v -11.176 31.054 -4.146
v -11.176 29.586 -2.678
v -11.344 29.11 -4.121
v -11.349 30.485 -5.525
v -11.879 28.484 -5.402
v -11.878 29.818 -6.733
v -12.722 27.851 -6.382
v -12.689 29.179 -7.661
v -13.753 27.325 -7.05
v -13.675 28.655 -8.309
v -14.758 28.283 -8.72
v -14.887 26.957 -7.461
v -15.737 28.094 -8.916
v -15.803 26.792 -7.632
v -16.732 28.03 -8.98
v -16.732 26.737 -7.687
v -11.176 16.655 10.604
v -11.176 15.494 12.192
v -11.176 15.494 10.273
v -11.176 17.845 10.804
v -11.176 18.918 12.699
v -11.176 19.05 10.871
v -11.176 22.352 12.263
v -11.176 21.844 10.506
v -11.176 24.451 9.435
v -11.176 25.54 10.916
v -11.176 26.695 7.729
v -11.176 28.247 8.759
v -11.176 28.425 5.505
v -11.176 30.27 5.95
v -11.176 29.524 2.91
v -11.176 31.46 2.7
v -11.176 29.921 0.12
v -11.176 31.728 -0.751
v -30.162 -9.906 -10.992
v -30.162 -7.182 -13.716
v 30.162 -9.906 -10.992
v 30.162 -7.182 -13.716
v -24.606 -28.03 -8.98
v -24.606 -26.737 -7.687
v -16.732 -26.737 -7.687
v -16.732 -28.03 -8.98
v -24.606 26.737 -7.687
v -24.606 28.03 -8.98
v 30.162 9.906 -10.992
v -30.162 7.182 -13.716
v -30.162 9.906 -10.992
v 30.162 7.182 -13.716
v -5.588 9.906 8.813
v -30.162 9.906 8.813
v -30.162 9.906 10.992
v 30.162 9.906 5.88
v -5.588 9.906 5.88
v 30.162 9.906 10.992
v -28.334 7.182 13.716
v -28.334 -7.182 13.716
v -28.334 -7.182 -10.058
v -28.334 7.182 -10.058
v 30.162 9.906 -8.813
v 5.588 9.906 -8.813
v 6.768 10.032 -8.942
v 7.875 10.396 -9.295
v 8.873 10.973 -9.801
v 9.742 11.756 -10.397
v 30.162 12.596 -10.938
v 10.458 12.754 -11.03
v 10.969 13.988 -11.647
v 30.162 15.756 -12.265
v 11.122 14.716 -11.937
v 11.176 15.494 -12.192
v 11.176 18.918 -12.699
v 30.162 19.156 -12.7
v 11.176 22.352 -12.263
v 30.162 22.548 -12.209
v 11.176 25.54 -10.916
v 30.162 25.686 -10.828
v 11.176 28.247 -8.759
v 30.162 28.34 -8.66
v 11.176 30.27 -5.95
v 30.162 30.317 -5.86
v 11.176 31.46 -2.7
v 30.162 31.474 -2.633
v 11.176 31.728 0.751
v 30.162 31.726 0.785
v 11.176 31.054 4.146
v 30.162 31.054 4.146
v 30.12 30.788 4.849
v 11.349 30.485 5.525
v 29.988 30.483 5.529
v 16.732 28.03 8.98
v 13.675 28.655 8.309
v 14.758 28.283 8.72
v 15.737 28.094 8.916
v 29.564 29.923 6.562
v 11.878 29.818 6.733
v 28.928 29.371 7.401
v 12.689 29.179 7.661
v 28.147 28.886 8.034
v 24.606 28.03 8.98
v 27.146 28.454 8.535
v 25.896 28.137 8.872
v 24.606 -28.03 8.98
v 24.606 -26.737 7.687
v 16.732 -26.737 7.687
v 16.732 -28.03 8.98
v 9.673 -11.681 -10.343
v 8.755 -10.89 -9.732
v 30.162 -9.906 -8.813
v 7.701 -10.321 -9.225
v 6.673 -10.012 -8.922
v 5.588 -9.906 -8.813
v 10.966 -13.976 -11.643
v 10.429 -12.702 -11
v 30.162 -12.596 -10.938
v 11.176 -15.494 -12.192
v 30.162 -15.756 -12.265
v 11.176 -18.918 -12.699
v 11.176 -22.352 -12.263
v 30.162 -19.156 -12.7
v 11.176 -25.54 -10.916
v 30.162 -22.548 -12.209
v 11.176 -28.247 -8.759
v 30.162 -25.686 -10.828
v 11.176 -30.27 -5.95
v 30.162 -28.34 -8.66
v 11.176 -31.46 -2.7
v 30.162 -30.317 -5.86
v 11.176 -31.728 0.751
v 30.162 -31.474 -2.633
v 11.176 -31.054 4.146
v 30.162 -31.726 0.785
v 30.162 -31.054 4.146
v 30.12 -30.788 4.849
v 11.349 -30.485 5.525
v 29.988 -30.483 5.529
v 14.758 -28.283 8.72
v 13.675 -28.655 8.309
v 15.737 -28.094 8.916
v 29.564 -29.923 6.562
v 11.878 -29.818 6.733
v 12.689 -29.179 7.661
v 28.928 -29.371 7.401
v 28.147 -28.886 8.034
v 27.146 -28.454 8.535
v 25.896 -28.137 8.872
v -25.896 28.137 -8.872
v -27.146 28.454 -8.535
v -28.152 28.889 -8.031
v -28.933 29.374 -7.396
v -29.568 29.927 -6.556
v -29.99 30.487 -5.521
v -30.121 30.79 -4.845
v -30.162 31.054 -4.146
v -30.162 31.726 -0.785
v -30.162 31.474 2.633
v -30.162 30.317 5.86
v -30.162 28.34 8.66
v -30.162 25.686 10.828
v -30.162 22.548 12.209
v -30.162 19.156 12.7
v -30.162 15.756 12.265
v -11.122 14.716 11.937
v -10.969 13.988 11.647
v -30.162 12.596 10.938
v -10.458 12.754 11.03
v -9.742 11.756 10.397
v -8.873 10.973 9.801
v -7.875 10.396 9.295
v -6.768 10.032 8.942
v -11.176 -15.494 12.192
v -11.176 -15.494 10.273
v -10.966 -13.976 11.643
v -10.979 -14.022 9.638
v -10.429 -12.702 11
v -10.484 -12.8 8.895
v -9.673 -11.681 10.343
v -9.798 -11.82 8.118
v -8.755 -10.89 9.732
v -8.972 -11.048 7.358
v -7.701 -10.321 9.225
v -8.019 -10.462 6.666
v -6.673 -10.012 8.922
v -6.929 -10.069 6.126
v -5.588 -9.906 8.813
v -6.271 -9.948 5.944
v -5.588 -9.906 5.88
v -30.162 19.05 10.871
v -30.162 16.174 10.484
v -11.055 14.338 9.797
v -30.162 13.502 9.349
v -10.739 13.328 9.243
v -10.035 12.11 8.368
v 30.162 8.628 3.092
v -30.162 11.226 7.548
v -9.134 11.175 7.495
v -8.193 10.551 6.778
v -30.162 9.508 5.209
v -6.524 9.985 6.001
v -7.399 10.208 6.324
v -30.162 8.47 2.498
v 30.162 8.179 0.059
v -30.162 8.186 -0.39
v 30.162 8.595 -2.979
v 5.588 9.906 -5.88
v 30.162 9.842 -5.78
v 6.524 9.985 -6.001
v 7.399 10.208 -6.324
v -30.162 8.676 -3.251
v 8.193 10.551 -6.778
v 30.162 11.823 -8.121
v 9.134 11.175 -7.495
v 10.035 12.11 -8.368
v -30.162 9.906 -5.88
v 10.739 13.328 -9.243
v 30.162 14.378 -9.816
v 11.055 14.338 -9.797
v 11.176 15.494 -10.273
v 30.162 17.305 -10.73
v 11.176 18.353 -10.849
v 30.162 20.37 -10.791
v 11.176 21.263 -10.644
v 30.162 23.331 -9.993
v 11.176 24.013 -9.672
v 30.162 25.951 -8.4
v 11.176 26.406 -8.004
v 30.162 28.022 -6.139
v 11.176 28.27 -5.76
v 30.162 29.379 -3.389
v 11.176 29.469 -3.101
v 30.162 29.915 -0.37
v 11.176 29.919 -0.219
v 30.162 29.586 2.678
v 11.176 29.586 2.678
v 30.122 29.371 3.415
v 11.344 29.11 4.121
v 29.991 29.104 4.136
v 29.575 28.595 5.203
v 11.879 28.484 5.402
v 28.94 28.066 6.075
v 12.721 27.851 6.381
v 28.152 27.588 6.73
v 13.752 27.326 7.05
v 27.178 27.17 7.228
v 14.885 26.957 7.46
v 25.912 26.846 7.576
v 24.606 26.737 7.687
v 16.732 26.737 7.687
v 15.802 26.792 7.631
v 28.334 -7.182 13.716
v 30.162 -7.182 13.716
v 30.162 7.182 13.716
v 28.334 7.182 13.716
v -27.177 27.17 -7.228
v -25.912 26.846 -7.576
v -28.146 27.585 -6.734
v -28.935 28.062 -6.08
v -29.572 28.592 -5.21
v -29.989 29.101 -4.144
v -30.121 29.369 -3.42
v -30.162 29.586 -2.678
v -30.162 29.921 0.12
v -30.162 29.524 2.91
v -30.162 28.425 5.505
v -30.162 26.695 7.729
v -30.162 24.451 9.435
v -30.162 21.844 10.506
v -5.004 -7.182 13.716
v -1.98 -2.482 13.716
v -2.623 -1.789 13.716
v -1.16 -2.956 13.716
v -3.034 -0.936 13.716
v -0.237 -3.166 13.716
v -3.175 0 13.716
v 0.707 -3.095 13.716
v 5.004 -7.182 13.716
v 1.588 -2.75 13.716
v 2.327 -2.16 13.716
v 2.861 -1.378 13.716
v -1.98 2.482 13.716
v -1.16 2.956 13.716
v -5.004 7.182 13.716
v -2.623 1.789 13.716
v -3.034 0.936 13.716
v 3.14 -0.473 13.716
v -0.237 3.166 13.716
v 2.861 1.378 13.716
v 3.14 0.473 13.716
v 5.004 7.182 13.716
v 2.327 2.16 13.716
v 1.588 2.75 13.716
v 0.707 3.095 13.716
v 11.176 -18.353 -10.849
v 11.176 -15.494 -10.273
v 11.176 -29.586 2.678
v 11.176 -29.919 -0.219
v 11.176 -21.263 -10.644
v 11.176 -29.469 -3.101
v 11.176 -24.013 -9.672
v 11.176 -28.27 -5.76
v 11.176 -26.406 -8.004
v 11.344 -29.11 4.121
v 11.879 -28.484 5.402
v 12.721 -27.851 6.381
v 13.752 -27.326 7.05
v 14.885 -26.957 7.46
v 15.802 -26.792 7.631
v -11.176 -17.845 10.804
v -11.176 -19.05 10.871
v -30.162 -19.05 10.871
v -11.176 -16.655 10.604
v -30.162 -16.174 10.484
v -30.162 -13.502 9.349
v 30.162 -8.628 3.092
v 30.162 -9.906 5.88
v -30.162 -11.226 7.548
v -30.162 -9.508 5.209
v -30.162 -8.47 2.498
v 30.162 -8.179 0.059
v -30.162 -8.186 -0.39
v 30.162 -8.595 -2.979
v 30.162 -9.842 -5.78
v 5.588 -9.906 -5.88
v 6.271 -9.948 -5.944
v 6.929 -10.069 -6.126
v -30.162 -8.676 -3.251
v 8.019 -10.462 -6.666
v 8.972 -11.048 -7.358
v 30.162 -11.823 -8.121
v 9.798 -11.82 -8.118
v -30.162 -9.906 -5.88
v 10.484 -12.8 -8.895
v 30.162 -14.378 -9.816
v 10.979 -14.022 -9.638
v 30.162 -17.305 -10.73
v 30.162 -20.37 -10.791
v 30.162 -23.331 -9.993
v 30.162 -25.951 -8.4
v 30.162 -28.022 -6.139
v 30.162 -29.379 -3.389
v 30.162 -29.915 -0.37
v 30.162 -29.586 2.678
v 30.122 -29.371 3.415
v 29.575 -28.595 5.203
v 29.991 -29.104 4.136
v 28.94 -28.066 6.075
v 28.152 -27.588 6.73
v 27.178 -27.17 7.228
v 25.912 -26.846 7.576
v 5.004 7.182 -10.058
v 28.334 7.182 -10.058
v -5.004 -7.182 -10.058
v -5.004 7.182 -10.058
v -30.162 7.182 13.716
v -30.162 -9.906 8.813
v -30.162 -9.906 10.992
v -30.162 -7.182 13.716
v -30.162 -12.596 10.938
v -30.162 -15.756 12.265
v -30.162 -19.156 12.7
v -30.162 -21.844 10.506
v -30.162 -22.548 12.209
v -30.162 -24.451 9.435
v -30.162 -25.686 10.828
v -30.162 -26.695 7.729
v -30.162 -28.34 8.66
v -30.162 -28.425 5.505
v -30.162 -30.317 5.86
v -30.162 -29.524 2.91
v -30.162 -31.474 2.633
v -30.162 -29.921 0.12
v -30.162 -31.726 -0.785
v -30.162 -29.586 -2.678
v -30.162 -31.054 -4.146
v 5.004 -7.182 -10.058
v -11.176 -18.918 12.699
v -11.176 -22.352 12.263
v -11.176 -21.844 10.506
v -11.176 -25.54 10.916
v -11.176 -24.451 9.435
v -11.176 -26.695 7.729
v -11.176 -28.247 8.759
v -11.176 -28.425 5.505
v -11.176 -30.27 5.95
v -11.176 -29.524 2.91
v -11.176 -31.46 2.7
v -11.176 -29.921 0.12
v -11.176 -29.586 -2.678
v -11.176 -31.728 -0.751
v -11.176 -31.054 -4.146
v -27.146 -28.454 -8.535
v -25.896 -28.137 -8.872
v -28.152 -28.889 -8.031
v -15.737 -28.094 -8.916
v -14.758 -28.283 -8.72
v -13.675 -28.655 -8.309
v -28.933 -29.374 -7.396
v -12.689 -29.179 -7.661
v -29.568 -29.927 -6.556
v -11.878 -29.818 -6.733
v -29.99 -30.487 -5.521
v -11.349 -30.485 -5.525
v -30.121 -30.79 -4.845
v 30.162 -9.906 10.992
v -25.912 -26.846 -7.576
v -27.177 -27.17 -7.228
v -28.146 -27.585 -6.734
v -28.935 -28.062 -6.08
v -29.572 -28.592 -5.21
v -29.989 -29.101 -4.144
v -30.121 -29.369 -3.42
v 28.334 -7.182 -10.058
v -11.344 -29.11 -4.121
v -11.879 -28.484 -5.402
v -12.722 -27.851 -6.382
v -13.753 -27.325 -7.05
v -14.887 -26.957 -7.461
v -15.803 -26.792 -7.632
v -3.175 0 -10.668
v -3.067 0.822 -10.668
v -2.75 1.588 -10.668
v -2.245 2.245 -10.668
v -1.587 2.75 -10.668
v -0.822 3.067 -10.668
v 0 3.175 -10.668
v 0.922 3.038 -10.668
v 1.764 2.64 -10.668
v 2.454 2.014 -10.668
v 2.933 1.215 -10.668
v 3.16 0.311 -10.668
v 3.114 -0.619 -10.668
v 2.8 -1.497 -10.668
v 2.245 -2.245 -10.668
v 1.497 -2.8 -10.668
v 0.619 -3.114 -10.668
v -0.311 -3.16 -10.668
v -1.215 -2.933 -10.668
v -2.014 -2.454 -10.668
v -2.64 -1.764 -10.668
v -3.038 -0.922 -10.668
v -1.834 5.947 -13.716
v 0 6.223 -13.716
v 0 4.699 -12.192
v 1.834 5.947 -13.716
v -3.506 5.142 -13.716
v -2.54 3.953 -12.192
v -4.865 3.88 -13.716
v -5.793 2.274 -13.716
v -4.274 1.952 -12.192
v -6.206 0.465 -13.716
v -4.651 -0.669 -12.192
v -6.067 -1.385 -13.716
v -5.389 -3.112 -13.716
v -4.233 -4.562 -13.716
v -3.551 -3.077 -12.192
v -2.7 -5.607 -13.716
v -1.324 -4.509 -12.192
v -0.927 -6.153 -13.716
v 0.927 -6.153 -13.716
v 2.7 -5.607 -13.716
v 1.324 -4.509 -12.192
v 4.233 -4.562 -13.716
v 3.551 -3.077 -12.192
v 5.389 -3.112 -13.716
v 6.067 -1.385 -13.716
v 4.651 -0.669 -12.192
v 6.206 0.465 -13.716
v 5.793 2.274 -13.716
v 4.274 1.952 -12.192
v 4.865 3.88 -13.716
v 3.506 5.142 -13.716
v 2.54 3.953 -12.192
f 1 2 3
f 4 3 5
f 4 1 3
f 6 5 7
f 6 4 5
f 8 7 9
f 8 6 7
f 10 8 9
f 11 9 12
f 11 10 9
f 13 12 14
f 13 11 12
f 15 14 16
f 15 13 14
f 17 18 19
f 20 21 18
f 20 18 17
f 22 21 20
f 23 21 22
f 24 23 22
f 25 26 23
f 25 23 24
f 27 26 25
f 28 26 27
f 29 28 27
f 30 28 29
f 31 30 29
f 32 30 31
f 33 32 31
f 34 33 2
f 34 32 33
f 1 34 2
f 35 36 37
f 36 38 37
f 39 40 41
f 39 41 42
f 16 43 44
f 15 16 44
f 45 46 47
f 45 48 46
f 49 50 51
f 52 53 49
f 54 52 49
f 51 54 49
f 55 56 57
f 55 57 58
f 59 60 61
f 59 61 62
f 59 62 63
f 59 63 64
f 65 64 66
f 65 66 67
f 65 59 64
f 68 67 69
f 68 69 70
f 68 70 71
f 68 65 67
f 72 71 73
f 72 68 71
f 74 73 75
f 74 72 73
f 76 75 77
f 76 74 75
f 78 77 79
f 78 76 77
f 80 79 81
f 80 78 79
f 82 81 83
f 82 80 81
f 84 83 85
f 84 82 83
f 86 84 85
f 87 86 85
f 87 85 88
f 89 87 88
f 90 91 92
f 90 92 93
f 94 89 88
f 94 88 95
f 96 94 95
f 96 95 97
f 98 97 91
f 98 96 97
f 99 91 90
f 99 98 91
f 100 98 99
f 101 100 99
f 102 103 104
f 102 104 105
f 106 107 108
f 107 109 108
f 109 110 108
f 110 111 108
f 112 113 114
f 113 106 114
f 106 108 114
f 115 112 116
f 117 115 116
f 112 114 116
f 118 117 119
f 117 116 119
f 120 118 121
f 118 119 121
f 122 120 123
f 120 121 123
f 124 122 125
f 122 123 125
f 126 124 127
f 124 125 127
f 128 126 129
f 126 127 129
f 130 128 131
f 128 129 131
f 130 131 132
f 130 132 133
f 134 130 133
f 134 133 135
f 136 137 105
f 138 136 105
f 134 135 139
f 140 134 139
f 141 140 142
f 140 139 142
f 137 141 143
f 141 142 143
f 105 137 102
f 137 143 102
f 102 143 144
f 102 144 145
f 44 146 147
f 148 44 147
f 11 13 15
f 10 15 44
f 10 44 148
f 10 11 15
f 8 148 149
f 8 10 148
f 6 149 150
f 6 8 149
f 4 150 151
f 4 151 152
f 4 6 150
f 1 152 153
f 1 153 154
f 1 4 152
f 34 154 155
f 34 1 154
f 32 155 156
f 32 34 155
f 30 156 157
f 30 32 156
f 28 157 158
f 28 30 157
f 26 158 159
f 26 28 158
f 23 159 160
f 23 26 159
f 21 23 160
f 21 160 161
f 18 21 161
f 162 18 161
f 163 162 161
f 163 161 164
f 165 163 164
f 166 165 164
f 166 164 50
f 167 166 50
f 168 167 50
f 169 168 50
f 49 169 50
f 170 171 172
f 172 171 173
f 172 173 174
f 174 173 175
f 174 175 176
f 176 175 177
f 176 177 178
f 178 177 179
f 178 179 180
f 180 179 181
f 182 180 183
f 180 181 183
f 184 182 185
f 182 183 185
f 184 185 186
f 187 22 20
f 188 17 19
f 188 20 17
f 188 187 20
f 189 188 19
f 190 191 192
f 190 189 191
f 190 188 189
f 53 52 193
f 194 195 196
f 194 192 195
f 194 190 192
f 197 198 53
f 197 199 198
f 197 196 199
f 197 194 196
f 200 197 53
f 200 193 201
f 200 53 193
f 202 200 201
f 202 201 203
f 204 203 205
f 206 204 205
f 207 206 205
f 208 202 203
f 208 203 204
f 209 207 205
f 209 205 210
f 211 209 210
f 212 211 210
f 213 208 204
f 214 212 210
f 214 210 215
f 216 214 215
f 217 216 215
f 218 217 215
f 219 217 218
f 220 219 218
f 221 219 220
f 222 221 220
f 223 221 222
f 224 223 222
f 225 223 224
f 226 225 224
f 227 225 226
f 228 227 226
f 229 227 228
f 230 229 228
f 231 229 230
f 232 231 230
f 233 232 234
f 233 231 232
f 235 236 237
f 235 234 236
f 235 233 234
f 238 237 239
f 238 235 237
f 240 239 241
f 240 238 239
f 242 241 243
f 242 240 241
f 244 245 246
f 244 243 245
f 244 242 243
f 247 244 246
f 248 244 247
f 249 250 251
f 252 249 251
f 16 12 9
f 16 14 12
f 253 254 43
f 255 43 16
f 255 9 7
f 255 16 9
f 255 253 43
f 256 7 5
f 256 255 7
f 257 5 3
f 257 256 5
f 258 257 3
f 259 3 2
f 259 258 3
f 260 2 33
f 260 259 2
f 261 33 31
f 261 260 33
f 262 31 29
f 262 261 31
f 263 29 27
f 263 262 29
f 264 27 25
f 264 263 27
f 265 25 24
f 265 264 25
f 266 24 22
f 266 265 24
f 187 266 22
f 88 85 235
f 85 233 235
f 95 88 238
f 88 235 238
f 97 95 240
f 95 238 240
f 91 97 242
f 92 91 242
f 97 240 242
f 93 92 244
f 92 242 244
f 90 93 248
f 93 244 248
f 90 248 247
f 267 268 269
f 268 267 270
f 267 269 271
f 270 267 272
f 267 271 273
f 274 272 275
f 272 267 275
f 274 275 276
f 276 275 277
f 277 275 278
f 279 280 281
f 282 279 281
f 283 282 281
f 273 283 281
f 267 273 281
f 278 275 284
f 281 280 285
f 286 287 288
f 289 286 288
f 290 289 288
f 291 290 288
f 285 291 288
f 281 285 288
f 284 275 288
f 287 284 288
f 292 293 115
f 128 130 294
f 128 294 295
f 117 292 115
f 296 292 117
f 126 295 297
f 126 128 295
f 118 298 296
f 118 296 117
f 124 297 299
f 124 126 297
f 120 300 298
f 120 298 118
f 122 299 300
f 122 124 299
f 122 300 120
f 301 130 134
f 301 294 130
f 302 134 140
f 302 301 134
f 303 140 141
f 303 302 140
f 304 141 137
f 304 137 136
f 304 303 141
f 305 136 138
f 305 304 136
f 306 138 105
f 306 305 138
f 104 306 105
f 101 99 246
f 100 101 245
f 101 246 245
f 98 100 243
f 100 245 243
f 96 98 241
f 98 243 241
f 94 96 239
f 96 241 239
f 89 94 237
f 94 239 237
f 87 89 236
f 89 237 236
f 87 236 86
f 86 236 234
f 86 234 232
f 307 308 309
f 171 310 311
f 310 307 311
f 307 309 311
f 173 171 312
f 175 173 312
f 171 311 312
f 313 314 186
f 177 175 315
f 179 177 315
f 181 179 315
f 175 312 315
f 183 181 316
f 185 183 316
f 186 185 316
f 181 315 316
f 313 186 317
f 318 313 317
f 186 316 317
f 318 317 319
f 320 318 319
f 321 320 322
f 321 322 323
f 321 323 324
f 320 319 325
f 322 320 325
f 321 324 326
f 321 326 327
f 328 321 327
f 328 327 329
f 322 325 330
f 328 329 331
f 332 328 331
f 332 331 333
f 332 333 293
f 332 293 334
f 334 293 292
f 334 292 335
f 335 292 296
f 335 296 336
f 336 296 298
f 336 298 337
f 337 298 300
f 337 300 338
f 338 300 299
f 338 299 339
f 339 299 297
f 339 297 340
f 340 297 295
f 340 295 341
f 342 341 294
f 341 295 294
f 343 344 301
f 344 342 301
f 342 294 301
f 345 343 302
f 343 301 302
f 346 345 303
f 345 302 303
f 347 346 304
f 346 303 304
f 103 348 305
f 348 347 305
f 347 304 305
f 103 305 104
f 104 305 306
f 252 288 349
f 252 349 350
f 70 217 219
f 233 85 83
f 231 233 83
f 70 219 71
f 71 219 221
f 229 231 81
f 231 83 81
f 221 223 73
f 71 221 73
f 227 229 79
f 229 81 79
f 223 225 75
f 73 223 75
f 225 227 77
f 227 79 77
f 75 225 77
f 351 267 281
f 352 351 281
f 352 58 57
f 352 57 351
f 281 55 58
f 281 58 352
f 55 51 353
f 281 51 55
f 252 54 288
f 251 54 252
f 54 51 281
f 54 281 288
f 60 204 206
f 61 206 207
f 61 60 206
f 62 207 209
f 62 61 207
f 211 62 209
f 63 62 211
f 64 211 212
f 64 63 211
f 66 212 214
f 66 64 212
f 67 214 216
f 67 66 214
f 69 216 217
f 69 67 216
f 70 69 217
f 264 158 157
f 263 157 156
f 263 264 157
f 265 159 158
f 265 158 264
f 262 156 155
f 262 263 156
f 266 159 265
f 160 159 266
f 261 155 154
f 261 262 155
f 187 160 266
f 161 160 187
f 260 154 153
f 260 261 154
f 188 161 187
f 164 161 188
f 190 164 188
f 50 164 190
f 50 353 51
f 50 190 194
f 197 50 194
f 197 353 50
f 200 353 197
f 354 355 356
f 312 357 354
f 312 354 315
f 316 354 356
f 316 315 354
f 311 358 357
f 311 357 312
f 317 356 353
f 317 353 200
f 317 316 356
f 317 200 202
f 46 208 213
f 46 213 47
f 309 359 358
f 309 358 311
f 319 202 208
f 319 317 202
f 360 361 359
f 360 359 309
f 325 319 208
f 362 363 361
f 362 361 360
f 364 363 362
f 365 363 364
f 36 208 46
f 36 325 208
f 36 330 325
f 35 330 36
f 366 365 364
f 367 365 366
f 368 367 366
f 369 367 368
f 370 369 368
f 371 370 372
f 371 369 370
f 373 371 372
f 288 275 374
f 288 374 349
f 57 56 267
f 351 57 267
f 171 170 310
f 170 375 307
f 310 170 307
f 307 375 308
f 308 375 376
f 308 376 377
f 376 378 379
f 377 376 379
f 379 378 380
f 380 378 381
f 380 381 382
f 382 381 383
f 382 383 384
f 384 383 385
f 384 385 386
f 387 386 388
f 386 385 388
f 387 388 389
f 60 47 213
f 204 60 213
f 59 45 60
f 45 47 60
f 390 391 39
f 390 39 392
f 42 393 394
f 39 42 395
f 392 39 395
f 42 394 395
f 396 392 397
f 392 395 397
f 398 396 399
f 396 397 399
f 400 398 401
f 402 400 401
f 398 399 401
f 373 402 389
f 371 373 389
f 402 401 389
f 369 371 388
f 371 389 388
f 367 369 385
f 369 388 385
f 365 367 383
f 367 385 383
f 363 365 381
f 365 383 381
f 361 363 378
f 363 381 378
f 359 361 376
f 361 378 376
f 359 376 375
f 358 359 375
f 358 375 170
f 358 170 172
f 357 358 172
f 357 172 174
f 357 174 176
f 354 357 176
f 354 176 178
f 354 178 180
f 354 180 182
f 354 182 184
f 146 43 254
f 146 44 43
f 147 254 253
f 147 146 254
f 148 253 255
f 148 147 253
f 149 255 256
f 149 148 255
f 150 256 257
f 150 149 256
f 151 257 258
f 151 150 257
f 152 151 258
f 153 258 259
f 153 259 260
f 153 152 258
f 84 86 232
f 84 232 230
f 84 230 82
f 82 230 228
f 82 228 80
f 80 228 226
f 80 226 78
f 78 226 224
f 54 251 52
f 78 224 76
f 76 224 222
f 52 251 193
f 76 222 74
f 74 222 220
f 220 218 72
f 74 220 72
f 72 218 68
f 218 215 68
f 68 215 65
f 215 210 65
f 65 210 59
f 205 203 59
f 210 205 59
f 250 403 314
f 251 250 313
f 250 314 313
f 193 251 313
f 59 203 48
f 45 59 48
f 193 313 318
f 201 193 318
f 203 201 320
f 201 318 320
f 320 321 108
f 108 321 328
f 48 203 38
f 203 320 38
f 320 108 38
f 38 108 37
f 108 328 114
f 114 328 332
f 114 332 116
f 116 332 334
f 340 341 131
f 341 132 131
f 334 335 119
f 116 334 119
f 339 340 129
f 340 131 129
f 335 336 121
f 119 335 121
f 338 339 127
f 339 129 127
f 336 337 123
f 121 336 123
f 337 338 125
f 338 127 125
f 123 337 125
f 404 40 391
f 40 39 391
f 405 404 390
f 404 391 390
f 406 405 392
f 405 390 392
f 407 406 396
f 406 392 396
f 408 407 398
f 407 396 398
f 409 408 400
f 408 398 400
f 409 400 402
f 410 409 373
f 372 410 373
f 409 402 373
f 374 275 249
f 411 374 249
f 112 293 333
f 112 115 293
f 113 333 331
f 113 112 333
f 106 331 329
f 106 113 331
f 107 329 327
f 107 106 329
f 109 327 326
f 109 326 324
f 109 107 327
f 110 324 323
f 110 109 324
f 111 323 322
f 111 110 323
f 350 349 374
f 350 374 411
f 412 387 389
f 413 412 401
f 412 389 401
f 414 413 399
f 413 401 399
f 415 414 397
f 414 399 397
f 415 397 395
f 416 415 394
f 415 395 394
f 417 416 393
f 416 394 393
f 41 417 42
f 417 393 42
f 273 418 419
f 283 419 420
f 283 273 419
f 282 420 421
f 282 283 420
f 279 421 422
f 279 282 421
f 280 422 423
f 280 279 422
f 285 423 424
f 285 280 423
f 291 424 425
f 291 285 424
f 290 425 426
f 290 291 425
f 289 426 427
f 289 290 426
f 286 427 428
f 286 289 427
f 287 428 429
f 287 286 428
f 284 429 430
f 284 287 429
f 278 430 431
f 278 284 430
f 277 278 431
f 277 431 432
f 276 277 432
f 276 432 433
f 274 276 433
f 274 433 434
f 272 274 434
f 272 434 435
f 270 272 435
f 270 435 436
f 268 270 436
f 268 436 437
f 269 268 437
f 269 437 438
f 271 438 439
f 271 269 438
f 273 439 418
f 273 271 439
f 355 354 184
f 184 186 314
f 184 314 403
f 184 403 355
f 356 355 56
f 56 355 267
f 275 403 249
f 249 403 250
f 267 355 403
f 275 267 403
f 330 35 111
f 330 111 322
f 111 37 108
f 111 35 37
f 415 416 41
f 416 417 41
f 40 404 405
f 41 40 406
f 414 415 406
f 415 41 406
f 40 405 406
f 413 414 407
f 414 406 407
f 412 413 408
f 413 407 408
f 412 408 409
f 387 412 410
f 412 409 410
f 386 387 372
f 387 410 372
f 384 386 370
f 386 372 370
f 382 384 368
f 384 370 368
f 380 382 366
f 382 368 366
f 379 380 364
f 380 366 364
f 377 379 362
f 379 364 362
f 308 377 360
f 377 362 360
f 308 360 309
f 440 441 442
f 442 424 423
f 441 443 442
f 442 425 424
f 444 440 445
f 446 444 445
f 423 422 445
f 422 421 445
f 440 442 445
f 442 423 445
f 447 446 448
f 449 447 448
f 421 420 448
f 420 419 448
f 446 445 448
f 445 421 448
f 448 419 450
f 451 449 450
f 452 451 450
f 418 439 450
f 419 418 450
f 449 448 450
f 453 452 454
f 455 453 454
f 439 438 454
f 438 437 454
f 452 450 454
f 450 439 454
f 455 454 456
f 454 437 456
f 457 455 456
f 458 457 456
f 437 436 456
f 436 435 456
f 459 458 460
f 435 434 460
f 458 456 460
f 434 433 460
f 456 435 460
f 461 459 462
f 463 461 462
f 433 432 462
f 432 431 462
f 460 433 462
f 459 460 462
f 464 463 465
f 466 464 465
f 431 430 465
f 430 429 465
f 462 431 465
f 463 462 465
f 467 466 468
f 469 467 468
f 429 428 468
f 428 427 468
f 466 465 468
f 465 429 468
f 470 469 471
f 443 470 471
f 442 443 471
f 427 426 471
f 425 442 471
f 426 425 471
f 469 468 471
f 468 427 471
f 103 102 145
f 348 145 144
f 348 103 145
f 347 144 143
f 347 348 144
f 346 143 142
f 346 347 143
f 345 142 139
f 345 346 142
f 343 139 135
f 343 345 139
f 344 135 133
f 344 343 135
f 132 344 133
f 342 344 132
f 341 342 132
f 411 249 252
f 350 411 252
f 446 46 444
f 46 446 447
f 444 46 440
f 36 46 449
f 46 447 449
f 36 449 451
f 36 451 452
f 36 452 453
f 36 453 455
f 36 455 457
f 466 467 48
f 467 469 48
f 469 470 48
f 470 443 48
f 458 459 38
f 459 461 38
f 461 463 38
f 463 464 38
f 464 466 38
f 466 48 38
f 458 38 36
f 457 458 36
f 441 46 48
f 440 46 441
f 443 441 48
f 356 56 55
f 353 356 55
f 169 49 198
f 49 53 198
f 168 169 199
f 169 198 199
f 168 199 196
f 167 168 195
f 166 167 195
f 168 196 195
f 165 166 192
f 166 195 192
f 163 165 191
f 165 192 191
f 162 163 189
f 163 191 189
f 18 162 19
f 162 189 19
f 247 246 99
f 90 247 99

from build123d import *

# Parameters (mm, degrees)
SKETCH2_R               = 10.8712
BOSS_EXTRUDE2_DEPTH     = 30.1625
CUT_EXTRUDE1_DEPTH      = 11.176
CUT_EXTRUDE2_DEPTH      = 46.890822201
CIRPATTERN1_COUNT       = 2
FILLET1_R               = 5.55625
CUT_EXTRUDE3_DEPTH      = 46.890822336
CUT_EXTRUDE3_DEPTH_BACK = 46.890822336
SKETCH5_R               = 3.175
SKETCH7_W               = 23.3299
SKETCH7_H               = 14.3637
CUT_EXTRUDE5_DEPTH      = 23.7744
FILLET2_R               = 5.588


with BuildPart() as part:
    # Sketch2 → Boss-Extrude2 (new, symmetric)
    with BuildSketch(Plane(origin=(0, 0, 0), x_dir=(0, 0, -1), z_dir=(1, 0, 0))):
        with BuildLine():
            Line((-8.813470599, 9.906), (-10.99185, 9.906))
            Line((-10.99185, 9.906), (-13.716, 7.18185))
            Line((-13.716, 7.18185), (-13.716, 0))
            Line((-13.716, 0), (13.716, 0))
            Line((13.716, 0), (13.716, 7.18185))
            Line((13.716, 7.18185), (10.99185, 9.906))
            Line((10.99185, 9.906), (8.813470599, 9.906))
            ThreePointArc((8.813470599, 9.906), (0, 31.75), (-8.813470599, 9.906))
        make_face()
        with Locations(Location((0, 19.05, 0), (0, 0, 180))):
            Circle(SKETCH2_R, mode=Mode.SUBTRACT)
    extrude(amount=BOSS_EXTRUDE2_DEPTH, both=True)

    # Sketch3 → Cut-Extrude1 (cut, symmetric)
    with BuildSketch(Plane(origin=(0, 0, 0), x_dir=(0, 0, -1), z_dir=(1, 0, 0))):
        with BuildLine():
            Line((-8.813470599, 9.906), (-5.879647391, 9.906))
            ThreePointArc((-5.879647391, 9.906), (0, 29.9212), (5.879647391, 9.906))
            Line((5.879647391, 9.906), (8.813470599, 9.906))
            ThreePointArc((8.813470599, 9.906), (0, 31.75), (-8.813470599, 9.906))
        make_face()
    extrude(amount=CUT_EXTRUDE1_DEPTH, both=True, mode=Mode.SUBTRACT)

    # Sketch4 → Cut-Extrude2 (cut, through all)
    with BuildSketch(Plane(origin=(0, 0, 0), x_dir=(0, 0, -1), z_dir=(1, 0, 0))):
        with BuildLine():
            Line((-7.68709924, 26.73709924), (-8.980256121, 28.030256121))
            ThreePointArc((-8.980256121, 28.030256121), (-12.699462297, 18.933135262), (-8.813470599, 9.906))
            Line((-8.813470599, 9.906), (-5.879647391, 9.906))
            ThreePointArc((-5.879647391, 9.906), (-10.809053101, 17.889241411), (-7.68709924, 26.73709924))
        make_face()
    cut_extrude2 = extrude(amount=CUT_EXTRUDE2_DEPTH, mode=Mode.SUBTRACT)

    # CirPattern1: Cut-Extrude2 ×2 about axis
    cirpattern1_axis = Axis((0, 34.925, 0), (0, -1, 0))
    for i in range(1, CIRPATTERN1_COUNT):
        add(cut_extrude2.rotate(cirpattern1_axis, i * 360 / CIRPATTERN1_COUNT), mode=Mode.SUBTRACT)

    # Fillet1
    fillet1_edges = [part.edges().sort_by_distance(p)[0] for p in [
        (11.176, 27.38367768, 8.33367768),
        (30.1625, 27.38367768, 8.33367768),
        (-11.176, 27.38367768, -8.33367768),
        (-30.1625, 27.38367768, -8.33367768),
    ]]
    fillet(fillet1_edges, radius=FILLET1_R)

    # Mirror1: part across plane


with BuildPart() as part_1:
    add(part.part)
    add(part.part.mirror(Plane.ZX))

    # Sketch5 → Cut-Extrude3 (cut, two sides: drawn at the far end of the back side and taken through both)
    with BuildSketch(Plane(origin=(0, 0, 0), x_dir=(-1, 0, 0), z_dir=(0, 0, -1)).offset(-CUT_EXTRUDE3_DEPTH_BACK)):
        Circle(SKETCH5_R)
    extrude(amount=CUT_EXTRUDE3_DEPTH + CUT_EXTRUDE3_DEPTH_BACK, mode=Mode.SUBTRACT)

    # Cut-Extrude4 cone 1 section (through the dimple's axis) → Cut-Extrude4 (revolve, cut)
    with BuildSketch(Plane(origin=(0, 0, -13.716), x_dir=(0, 1, 0), z_dir=(1, 0, 0))):
        Polygon((0, 0), (6.223, 0), (0, 6.223), align=None)
    revolve(axis=Axis((0, 0, -13.716), (0, 0, 1)), mode=Mode.SUBTRACT)

    # Sketch7 → Cut-Extrude5 (cut)
    with BuildSketch(Plane.XY.offset(13.716)):
        with Locations((-16.66875, 0)):
            Rectangle(SKETCH7_W, SKETCH7_H)
        with Locations((16.66875, 0)):
            Rectangle(SKETCH7_W, SKETCH7_H)
    extrude(amount=-CUT_EXTRUDE5_DEPTH, mode=Mode.SUBTRACT)

    # Fillet2
    fillet2_edges = [part_1.edges().sort_by_distance(p)[0] for p in [
        (11.176, -9.906, -7.346558995),
        (-11.176, -9.906, 7.346558995),
        (-11.176, 9.906, 7.346558995),
        (11.176, 9.906, -7.346558995),
    ]]
    fillet(fillet2_edges, radius=FILLET2_R)


solid = part_1.part
